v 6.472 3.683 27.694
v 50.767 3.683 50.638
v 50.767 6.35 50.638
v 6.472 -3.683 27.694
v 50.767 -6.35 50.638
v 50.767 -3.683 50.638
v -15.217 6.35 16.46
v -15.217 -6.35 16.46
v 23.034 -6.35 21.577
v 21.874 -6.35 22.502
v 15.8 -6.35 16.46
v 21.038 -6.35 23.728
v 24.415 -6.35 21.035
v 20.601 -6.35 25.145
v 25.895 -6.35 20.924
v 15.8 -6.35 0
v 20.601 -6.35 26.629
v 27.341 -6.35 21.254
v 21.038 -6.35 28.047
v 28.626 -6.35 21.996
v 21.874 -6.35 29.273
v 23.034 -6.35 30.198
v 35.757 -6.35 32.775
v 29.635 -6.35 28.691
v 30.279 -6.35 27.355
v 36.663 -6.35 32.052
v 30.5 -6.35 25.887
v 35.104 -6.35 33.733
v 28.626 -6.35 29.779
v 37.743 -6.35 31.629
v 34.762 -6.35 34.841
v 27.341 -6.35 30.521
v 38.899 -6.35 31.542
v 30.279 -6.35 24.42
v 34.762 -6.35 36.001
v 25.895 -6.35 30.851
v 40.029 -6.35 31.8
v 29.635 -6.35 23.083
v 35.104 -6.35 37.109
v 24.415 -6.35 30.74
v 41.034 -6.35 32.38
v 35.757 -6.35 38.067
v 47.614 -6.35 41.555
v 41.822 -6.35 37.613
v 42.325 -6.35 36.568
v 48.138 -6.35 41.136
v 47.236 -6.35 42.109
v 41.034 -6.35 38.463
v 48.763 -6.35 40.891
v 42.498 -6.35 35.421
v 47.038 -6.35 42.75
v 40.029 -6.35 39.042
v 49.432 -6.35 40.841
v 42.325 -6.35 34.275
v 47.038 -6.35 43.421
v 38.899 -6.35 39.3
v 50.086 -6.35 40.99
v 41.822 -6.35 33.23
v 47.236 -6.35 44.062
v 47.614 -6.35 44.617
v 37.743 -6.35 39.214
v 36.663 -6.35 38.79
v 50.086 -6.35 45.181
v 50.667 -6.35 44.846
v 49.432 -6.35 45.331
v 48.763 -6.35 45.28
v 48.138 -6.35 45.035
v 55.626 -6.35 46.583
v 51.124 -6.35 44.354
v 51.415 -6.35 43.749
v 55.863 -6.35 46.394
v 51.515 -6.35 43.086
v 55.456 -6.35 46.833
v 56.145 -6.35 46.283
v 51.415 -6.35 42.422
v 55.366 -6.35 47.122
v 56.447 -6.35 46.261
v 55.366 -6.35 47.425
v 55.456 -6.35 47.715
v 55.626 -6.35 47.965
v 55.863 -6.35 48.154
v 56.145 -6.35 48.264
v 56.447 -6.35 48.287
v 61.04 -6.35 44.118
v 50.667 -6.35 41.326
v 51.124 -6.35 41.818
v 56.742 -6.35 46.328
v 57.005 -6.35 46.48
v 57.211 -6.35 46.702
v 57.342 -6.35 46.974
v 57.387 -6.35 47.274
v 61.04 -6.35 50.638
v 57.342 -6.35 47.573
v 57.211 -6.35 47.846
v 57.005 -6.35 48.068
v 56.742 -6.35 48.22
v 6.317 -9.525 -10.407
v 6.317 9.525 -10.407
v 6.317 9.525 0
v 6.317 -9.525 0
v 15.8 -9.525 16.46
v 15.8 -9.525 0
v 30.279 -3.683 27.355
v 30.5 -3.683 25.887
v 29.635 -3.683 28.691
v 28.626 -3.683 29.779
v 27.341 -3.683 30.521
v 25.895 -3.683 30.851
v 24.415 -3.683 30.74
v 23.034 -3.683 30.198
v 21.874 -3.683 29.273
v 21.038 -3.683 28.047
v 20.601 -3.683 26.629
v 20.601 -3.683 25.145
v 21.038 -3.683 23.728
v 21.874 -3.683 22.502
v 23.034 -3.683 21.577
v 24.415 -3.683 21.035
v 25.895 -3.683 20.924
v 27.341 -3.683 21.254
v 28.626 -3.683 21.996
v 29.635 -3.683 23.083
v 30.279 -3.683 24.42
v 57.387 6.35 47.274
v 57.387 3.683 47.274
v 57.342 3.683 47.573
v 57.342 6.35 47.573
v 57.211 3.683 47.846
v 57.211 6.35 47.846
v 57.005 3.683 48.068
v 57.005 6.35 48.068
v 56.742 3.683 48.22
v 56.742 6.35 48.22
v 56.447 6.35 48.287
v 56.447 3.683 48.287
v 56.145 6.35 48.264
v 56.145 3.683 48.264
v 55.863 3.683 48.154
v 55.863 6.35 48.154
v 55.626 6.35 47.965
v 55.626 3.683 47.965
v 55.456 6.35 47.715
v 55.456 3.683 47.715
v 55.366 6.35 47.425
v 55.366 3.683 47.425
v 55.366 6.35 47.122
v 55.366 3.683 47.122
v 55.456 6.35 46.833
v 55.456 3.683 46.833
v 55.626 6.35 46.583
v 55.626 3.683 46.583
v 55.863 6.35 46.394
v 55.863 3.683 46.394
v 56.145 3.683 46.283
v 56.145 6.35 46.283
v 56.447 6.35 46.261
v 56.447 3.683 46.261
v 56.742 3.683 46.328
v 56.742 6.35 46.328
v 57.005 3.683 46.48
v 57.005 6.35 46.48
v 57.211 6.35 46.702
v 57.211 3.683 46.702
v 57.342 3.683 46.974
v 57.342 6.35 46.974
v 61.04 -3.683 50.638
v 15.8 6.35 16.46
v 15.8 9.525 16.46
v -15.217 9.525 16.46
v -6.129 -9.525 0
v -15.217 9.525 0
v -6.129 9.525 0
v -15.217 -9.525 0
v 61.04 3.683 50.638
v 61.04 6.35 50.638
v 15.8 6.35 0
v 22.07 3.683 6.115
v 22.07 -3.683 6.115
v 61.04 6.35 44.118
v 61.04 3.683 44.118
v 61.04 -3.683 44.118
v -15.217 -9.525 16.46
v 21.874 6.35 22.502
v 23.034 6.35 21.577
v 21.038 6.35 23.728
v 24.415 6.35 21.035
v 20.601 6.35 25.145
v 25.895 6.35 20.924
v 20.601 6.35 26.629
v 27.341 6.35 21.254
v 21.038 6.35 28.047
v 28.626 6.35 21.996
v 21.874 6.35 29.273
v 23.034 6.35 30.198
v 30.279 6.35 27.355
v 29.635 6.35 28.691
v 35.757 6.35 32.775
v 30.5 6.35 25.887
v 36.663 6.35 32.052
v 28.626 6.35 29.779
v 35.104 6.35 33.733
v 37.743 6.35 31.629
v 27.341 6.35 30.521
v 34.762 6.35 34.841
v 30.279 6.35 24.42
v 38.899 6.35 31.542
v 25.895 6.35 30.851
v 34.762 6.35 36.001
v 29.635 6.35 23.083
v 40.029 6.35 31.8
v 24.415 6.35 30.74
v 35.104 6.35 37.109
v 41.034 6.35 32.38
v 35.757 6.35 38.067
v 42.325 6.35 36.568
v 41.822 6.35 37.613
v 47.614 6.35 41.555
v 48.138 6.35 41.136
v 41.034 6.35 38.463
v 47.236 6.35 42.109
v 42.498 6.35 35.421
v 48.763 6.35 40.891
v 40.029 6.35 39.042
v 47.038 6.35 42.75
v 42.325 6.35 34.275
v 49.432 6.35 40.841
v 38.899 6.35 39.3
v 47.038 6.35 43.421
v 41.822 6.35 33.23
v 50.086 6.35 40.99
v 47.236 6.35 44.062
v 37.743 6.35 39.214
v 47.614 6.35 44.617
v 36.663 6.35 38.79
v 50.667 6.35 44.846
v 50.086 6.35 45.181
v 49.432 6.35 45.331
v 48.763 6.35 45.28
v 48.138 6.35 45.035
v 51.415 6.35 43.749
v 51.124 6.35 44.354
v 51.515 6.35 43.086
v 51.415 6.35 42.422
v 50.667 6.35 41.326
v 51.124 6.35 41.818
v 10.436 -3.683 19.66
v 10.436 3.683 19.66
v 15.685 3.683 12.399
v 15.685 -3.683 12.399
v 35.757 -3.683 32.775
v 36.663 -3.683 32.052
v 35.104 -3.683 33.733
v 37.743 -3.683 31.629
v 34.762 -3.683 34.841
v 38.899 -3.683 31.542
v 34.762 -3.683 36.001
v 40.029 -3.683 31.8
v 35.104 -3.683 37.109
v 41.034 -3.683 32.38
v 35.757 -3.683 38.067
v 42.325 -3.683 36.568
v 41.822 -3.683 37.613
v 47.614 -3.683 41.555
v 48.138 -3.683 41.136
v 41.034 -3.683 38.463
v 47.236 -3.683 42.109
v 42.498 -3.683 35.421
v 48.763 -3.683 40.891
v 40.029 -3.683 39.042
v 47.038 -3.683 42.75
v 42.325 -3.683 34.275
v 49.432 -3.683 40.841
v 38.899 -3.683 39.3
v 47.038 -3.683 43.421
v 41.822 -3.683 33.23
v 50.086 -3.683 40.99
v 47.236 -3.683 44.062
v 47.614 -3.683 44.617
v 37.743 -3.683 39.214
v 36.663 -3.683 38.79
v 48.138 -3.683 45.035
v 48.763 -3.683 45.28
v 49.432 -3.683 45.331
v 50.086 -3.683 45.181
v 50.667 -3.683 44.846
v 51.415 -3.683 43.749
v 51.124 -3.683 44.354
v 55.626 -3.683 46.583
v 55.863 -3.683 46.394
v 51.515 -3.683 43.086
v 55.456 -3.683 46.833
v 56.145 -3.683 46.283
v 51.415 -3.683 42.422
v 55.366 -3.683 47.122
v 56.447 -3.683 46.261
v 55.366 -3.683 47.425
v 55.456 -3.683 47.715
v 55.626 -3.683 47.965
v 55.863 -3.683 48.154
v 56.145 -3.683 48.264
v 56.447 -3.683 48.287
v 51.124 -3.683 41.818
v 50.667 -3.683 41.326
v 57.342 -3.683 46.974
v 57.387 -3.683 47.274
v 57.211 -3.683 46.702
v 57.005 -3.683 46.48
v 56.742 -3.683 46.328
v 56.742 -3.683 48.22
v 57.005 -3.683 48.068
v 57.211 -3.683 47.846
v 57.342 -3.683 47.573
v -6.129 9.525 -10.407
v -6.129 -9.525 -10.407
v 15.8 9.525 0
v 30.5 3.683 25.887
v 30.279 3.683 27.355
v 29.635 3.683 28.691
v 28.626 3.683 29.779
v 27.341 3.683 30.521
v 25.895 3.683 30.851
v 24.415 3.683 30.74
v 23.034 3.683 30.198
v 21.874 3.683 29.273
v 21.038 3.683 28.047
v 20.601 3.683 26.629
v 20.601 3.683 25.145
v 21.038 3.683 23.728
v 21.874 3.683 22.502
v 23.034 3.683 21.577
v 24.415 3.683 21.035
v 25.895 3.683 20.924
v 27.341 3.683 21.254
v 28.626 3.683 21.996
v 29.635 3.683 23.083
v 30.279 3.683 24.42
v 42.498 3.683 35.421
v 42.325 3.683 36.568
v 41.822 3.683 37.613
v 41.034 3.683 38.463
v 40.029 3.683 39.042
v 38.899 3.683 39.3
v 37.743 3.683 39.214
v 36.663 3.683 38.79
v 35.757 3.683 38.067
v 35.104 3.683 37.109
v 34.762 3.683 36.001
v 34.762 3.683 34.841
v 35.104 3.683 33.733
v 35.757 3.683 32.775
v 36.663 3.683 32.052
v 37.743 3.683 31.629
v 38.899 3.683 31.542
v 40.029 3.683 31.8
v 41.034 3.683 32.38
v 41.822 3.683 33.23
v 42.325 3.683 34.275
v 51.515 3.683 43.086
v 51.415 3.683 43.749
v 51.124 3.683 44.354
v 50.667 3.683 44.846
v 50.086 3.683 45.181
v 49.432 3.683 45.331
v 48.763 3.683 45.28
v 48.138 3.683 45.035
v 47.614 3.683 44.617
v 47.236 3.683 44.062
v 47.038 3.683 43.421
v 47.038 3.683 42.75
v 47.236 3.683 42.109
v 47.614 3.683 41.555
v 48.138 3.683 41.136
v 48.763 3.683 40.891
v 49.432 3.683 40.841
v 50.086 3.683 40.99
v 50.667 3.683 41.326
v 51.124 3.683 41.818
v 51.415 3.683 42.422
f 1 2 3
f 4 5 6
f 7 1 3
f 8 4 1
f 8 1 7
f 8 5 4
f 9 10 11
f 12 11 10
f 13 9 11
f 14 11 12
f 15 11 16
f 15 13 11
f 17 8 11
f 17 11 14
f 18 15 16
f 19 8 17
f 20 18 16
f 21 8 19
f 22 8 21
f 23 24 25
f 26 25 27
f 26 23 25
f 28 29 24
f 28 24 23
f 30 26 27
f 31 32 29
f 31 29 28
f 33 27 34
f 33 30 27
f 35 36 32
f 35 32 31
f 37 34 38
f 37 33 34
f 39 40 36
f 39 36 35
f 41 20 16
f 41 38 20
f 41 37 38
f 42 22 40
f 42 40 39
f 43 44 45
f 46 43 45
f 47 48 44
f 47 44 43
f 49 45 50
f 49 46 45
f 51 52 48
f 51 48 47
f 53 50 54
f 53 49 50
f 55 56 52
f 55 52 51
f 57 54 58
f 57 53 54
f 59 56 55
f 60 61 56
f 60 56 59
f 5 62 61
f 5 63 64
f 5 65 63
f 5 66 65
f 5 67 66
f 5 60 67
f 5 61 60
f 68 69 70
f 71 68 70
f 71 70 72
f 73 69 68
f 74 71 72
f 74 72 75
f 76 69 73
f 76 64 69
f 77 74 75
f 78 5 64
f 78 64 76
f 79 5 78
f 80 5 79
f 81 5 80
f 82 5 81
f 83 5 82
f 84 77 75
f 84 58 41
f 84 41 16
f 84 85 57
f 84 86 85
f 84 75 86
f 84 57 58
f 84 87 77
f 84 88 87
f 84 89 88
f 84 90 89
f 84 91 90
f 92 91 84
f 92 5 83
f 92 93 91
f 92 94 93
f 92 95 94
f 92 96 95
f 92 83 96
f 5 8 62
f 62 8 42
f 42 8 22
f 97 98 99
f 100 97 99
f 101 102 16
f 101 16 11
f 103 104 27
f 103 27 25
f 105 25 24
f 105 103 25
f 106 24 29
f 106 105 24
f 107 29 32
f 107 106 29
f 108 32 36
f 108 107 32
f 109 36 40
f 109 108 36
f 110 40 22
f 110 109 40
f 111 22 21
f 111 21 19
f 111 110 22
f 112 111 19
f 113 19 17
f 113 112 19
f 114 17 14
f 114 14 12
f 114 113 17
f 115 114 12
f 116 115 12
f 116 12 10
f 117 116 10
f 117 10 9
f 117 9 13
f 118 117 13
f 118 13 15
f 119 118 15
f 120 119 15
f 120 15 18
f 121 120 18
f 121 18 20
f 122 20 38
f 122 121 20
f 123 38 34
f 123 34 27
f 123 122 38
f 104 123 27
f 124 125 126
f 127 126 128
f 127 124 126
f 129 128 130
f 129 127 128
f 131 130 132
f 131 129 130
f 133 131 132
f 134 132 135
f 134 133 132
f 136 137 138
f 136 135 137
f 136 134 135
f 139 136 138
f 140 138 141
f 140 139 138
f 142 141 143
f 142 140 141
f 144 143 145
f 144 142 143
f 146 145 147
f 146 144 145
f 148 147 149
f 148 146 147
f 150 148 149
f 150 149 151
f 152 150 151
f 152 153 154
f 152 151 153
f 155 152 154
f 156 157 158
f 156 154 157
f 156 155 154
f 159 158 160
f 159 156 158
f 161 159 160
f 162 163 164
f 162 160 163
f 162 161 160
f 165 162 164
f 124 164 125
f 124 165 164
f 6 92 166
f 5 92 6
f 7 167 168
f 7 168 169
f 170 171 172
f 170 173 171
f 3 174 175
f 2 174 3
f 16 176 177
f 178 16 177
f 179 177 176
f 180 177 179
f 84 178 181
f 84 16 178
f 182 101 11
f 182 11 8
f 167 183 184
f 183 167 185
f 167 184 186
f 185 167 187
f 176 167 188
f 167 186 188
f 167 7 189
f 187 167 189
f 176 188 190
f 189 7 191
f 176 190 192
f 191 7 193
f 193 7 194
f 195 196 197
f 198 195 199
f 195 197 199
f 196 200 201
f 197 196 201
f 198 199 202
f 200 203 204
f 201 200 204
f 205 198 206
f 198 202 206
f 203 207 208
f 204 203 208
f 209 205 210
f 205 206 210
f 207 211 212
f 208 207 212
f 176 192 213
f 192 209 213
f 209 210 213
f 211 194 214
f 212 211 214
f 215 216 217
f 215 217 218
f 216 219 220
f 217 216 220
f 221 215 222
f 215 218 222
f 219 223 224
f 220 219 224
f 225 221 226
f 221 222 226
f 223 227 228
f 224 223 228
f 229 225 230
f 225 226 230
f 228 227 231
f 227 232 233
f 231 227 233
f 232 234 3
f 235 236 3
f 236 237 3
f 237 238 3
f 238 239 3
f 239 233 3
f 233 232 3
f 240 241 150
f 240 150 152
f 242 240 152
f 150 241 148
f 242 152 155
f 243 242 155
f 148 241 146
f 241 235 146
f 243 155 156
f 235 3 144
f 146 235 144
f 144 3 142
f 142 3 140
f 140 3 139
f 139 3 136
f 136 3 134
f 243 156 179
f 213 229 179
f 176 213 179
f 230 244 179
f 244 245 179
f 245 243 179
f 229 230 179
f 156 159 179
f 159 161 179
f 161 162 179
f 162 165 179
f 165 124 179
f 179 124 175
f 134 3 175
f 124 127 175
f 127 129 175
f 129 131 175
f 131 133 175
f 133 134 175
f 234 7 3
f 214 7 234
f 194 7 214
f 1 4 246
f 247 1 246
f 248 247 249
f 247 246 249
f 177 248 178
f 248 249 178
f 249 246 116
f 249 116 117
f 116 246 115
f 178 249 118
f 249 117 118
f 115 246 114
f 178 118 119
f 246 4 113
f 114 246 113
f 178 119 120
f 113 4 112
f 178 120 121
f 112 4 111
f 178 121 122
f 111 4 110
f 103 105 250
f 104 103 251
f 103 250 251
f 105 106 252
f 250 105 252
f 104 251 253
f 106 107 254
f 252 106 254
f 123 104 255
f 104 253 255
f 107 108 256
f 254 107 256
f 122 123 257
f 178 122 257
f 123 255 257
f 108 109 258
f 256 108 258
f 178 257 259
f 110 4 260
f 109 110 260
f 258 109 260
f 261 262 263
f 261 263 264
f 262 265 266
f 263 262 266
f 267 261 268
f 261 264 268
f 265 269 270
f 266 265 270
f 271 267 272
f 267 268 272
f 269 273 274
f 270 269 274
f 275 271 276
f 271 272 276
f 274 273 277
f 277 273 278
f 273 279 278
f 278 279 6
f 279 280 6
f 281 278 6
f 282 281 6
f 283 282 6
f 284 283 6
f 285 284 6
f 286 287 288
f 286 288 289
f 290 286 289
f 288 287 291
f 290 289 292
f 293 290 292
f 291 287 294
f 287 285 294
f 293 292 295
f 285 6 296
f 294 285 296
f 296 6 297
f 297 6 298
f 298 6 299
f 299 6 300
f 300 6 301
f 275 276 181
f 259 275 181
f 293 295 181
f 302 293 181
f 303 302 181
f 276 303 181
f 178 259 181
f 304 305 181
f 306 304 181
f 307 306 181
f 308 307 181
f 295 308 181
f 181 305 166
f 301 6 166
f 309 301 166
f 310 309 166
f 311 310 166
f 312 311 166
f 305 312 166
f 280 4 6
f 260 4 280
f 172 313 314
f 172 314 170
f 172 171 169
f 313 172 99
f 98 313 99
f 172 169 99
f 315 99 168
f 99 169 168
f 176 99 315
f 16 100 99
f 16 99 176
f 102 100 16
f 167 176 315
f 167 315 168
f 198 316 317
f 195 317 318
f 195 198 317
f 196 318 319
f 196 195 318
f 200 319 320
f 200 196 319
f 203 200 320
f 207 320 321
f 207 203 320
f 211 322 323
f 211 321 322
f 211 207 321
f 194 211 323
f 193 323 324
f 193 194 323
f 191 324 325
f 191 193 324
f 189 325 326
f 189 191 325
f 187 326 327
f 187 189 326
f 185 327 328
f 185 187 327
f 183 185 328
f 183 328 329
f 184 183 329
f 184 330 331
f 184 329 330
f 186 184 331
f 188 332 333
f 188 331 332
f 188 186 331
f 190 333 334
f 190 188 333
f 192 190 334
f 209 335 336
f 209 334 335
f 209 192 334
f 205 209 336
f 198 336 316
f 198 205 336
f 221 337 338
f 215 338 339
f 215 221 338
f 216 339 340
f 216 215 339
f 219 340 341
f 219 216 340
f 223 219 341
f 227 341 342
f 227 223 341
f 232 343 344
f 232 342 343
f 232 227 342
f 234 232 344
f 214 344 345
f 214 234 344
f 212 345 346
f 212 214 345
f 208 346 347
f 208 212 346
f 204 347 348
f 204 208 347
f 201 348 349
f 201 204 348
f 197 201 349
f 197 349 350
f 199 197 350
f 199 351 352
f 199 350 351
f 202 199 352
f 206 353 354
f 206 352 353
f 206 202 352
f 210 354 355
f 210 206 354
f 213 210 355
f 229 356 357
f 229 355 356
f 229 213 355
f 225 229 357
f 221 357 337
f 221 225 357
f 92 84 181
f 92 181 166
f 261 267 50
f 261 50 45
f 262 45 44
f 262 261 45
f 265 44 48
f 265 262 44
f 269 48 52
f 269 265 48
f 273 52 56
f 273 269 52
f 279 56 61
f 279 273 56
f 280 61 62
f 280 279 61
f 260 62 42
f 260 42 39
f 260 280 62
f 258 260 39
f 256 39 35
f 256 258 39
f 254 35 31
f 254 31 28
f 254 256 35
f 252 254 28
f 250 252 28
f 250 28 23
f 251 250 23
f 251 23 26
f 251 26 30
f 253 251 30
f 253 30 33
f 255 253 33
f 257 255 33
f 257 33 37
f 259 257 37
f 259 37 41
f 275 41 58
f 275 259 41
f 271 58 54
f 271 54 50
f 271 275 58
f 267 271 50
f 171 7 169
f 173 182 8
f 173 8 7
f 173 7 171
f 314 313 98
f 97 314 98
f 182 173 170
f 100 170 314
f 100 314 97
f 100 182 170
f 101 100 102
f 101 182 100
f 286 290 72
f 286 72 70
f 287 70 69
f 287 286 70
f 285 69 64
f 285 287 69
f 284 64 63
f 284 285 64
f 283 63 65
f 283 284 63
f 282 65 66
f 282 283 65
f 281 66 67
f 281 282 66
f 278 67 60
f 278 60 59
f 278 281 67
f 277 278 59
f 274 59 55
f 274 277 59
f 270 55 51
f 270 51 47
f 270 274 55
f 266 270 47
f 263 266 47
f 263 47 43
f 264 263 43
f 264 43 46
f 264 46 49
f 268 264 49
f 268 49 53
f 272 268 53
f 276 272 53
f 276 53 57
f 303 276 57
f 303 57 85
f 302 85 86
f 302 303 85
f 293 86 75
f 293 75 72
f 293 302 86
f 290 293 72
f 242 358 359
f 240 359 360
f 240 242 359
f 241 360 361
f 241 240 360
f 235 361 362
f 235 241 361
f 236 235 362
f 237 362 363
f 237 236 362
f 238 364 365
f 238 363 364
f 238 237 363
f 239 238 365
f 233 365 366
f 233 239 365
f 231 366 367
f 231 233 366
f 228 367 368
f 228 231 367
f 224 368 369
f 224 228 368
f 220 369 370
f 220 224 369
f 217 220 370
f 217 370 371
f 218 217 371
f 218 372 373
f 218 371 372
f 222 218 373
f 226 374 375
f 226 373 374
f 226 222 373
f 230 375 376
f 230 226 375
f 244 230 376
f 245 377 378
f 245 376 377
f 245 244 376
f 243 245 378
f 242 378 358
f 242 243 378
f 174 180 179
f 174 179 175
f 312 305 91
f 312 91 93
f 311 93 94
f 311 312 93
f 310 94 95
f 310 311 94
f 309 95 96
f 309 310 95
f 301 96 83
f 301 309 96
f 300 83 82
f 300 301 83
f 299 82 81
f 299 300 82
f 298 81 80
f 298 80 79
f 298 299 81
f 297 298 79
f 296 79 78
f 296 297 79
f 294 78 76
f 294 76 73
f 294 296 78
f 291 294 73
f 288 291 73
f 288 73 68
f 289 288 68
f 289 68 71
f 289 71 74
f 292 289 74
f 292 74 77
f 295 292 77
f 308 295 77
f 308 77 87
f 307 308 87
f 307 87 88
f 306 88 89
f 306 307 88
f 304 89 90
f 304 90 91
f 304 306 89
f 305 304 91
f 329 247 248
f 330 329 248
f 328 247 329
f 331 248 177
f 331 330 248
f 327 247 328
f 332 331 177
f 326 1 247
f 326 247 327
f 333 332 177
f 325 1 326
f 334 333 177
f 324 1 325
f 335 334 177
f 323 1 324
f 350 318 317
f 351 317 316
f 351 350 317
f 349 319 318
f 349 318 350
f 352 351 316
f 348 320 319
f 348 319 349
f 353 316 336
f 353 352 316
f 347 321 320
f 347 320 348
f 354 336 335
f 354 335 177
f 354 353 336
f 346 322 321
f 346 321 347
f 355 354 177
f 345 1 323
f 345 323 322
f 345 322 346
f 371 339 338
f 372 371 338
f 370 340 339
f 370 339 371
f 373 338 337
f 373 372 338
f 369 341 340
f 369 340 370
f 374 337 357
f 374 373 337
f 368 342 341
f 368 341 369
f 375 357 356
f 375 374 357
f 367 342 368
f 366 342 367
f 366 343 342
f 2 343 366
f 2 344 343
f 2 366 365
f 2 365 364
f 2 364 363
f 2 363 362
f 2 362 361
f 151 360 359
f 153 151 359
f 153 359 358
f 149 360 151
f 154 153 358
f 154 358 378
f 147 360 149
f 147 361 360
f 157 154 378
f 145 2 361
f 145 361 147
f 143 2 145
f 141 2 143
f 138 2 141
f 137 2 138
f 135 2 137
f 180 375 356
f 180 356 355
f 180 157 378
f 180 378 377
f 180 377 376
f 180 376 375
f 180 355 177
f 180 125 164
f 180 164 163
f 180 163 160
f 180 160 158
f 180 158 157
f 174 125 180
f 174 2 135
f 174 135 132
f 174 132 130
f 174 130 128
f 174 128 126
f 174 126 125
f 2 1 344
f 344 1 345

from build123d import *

# Parameters (mm, degrees)
F0_W     = 12.446
F0_H     = 10.407103
F1_DEPTH = 9.525
F0_R     = 4.977641
F0_R_2   = 3.889953
F0_R_3   = 2.251045
F0_R_4   = 1.016
F2_DEPTH = 6.35
F3_R     = 53.54887
F4_DEPTH = 3.683


with BuildPart() as f1:
    # F0 (on Front) → F1 (new body, symmetric)
    with BuildSketch(Plane.XZ):
        with Locations((0.093849, -5.203551)):
            Rectangle(F0_W, F0_H)
        Polygon((-15.216706, 0), (-6.129151, 0), (6.316849, 0), (15.799515, 0), (15.799515, 16.460452), (-15.216706, 16.460452), align=None)
    extrude(amount=F1_DEPTH, both=True)

    # F0 (on Front) → F2 (join, symmetric)
    with BuildSketch(Plane.XZ):
        Polygon((15.799515, 16.460452), (15.799515, 0), (61.039747, 44.118228), (61.039747, 50.637562), (50.766855, 50.637562), (-15.216706, 16.460452), align=None)
        with Locations((25.522564, 25.88735)):
            Circle(F0_R, mode=Mode.SUBTRACT)
        with Locations((38.608313, 35.421252)):
            Circle(F0_R_2, mode=Mode.SUBTRACT)
        with Locations((49.263846, 43.085761)):
            Circle(F0_R_3, mode=Mode.SUBTRACT)
        with Locations((56.371078, 47.273841)):
            Circle(F0_R_4, mode=Mode.SUBTRACT)
    extrude(amount=F2_DEPTH, both=True)

    # F3 (on Front) → F4 (cut, symmetric)
    with BuildSketch(Plane.XZ):
        with Locations((56.307051, 47.28929)):
            Circle(F3_R)
    extrude(amount=F4_DEPTH, both=True, mode=Mode.SUBTRACT)


solid = f1.part
